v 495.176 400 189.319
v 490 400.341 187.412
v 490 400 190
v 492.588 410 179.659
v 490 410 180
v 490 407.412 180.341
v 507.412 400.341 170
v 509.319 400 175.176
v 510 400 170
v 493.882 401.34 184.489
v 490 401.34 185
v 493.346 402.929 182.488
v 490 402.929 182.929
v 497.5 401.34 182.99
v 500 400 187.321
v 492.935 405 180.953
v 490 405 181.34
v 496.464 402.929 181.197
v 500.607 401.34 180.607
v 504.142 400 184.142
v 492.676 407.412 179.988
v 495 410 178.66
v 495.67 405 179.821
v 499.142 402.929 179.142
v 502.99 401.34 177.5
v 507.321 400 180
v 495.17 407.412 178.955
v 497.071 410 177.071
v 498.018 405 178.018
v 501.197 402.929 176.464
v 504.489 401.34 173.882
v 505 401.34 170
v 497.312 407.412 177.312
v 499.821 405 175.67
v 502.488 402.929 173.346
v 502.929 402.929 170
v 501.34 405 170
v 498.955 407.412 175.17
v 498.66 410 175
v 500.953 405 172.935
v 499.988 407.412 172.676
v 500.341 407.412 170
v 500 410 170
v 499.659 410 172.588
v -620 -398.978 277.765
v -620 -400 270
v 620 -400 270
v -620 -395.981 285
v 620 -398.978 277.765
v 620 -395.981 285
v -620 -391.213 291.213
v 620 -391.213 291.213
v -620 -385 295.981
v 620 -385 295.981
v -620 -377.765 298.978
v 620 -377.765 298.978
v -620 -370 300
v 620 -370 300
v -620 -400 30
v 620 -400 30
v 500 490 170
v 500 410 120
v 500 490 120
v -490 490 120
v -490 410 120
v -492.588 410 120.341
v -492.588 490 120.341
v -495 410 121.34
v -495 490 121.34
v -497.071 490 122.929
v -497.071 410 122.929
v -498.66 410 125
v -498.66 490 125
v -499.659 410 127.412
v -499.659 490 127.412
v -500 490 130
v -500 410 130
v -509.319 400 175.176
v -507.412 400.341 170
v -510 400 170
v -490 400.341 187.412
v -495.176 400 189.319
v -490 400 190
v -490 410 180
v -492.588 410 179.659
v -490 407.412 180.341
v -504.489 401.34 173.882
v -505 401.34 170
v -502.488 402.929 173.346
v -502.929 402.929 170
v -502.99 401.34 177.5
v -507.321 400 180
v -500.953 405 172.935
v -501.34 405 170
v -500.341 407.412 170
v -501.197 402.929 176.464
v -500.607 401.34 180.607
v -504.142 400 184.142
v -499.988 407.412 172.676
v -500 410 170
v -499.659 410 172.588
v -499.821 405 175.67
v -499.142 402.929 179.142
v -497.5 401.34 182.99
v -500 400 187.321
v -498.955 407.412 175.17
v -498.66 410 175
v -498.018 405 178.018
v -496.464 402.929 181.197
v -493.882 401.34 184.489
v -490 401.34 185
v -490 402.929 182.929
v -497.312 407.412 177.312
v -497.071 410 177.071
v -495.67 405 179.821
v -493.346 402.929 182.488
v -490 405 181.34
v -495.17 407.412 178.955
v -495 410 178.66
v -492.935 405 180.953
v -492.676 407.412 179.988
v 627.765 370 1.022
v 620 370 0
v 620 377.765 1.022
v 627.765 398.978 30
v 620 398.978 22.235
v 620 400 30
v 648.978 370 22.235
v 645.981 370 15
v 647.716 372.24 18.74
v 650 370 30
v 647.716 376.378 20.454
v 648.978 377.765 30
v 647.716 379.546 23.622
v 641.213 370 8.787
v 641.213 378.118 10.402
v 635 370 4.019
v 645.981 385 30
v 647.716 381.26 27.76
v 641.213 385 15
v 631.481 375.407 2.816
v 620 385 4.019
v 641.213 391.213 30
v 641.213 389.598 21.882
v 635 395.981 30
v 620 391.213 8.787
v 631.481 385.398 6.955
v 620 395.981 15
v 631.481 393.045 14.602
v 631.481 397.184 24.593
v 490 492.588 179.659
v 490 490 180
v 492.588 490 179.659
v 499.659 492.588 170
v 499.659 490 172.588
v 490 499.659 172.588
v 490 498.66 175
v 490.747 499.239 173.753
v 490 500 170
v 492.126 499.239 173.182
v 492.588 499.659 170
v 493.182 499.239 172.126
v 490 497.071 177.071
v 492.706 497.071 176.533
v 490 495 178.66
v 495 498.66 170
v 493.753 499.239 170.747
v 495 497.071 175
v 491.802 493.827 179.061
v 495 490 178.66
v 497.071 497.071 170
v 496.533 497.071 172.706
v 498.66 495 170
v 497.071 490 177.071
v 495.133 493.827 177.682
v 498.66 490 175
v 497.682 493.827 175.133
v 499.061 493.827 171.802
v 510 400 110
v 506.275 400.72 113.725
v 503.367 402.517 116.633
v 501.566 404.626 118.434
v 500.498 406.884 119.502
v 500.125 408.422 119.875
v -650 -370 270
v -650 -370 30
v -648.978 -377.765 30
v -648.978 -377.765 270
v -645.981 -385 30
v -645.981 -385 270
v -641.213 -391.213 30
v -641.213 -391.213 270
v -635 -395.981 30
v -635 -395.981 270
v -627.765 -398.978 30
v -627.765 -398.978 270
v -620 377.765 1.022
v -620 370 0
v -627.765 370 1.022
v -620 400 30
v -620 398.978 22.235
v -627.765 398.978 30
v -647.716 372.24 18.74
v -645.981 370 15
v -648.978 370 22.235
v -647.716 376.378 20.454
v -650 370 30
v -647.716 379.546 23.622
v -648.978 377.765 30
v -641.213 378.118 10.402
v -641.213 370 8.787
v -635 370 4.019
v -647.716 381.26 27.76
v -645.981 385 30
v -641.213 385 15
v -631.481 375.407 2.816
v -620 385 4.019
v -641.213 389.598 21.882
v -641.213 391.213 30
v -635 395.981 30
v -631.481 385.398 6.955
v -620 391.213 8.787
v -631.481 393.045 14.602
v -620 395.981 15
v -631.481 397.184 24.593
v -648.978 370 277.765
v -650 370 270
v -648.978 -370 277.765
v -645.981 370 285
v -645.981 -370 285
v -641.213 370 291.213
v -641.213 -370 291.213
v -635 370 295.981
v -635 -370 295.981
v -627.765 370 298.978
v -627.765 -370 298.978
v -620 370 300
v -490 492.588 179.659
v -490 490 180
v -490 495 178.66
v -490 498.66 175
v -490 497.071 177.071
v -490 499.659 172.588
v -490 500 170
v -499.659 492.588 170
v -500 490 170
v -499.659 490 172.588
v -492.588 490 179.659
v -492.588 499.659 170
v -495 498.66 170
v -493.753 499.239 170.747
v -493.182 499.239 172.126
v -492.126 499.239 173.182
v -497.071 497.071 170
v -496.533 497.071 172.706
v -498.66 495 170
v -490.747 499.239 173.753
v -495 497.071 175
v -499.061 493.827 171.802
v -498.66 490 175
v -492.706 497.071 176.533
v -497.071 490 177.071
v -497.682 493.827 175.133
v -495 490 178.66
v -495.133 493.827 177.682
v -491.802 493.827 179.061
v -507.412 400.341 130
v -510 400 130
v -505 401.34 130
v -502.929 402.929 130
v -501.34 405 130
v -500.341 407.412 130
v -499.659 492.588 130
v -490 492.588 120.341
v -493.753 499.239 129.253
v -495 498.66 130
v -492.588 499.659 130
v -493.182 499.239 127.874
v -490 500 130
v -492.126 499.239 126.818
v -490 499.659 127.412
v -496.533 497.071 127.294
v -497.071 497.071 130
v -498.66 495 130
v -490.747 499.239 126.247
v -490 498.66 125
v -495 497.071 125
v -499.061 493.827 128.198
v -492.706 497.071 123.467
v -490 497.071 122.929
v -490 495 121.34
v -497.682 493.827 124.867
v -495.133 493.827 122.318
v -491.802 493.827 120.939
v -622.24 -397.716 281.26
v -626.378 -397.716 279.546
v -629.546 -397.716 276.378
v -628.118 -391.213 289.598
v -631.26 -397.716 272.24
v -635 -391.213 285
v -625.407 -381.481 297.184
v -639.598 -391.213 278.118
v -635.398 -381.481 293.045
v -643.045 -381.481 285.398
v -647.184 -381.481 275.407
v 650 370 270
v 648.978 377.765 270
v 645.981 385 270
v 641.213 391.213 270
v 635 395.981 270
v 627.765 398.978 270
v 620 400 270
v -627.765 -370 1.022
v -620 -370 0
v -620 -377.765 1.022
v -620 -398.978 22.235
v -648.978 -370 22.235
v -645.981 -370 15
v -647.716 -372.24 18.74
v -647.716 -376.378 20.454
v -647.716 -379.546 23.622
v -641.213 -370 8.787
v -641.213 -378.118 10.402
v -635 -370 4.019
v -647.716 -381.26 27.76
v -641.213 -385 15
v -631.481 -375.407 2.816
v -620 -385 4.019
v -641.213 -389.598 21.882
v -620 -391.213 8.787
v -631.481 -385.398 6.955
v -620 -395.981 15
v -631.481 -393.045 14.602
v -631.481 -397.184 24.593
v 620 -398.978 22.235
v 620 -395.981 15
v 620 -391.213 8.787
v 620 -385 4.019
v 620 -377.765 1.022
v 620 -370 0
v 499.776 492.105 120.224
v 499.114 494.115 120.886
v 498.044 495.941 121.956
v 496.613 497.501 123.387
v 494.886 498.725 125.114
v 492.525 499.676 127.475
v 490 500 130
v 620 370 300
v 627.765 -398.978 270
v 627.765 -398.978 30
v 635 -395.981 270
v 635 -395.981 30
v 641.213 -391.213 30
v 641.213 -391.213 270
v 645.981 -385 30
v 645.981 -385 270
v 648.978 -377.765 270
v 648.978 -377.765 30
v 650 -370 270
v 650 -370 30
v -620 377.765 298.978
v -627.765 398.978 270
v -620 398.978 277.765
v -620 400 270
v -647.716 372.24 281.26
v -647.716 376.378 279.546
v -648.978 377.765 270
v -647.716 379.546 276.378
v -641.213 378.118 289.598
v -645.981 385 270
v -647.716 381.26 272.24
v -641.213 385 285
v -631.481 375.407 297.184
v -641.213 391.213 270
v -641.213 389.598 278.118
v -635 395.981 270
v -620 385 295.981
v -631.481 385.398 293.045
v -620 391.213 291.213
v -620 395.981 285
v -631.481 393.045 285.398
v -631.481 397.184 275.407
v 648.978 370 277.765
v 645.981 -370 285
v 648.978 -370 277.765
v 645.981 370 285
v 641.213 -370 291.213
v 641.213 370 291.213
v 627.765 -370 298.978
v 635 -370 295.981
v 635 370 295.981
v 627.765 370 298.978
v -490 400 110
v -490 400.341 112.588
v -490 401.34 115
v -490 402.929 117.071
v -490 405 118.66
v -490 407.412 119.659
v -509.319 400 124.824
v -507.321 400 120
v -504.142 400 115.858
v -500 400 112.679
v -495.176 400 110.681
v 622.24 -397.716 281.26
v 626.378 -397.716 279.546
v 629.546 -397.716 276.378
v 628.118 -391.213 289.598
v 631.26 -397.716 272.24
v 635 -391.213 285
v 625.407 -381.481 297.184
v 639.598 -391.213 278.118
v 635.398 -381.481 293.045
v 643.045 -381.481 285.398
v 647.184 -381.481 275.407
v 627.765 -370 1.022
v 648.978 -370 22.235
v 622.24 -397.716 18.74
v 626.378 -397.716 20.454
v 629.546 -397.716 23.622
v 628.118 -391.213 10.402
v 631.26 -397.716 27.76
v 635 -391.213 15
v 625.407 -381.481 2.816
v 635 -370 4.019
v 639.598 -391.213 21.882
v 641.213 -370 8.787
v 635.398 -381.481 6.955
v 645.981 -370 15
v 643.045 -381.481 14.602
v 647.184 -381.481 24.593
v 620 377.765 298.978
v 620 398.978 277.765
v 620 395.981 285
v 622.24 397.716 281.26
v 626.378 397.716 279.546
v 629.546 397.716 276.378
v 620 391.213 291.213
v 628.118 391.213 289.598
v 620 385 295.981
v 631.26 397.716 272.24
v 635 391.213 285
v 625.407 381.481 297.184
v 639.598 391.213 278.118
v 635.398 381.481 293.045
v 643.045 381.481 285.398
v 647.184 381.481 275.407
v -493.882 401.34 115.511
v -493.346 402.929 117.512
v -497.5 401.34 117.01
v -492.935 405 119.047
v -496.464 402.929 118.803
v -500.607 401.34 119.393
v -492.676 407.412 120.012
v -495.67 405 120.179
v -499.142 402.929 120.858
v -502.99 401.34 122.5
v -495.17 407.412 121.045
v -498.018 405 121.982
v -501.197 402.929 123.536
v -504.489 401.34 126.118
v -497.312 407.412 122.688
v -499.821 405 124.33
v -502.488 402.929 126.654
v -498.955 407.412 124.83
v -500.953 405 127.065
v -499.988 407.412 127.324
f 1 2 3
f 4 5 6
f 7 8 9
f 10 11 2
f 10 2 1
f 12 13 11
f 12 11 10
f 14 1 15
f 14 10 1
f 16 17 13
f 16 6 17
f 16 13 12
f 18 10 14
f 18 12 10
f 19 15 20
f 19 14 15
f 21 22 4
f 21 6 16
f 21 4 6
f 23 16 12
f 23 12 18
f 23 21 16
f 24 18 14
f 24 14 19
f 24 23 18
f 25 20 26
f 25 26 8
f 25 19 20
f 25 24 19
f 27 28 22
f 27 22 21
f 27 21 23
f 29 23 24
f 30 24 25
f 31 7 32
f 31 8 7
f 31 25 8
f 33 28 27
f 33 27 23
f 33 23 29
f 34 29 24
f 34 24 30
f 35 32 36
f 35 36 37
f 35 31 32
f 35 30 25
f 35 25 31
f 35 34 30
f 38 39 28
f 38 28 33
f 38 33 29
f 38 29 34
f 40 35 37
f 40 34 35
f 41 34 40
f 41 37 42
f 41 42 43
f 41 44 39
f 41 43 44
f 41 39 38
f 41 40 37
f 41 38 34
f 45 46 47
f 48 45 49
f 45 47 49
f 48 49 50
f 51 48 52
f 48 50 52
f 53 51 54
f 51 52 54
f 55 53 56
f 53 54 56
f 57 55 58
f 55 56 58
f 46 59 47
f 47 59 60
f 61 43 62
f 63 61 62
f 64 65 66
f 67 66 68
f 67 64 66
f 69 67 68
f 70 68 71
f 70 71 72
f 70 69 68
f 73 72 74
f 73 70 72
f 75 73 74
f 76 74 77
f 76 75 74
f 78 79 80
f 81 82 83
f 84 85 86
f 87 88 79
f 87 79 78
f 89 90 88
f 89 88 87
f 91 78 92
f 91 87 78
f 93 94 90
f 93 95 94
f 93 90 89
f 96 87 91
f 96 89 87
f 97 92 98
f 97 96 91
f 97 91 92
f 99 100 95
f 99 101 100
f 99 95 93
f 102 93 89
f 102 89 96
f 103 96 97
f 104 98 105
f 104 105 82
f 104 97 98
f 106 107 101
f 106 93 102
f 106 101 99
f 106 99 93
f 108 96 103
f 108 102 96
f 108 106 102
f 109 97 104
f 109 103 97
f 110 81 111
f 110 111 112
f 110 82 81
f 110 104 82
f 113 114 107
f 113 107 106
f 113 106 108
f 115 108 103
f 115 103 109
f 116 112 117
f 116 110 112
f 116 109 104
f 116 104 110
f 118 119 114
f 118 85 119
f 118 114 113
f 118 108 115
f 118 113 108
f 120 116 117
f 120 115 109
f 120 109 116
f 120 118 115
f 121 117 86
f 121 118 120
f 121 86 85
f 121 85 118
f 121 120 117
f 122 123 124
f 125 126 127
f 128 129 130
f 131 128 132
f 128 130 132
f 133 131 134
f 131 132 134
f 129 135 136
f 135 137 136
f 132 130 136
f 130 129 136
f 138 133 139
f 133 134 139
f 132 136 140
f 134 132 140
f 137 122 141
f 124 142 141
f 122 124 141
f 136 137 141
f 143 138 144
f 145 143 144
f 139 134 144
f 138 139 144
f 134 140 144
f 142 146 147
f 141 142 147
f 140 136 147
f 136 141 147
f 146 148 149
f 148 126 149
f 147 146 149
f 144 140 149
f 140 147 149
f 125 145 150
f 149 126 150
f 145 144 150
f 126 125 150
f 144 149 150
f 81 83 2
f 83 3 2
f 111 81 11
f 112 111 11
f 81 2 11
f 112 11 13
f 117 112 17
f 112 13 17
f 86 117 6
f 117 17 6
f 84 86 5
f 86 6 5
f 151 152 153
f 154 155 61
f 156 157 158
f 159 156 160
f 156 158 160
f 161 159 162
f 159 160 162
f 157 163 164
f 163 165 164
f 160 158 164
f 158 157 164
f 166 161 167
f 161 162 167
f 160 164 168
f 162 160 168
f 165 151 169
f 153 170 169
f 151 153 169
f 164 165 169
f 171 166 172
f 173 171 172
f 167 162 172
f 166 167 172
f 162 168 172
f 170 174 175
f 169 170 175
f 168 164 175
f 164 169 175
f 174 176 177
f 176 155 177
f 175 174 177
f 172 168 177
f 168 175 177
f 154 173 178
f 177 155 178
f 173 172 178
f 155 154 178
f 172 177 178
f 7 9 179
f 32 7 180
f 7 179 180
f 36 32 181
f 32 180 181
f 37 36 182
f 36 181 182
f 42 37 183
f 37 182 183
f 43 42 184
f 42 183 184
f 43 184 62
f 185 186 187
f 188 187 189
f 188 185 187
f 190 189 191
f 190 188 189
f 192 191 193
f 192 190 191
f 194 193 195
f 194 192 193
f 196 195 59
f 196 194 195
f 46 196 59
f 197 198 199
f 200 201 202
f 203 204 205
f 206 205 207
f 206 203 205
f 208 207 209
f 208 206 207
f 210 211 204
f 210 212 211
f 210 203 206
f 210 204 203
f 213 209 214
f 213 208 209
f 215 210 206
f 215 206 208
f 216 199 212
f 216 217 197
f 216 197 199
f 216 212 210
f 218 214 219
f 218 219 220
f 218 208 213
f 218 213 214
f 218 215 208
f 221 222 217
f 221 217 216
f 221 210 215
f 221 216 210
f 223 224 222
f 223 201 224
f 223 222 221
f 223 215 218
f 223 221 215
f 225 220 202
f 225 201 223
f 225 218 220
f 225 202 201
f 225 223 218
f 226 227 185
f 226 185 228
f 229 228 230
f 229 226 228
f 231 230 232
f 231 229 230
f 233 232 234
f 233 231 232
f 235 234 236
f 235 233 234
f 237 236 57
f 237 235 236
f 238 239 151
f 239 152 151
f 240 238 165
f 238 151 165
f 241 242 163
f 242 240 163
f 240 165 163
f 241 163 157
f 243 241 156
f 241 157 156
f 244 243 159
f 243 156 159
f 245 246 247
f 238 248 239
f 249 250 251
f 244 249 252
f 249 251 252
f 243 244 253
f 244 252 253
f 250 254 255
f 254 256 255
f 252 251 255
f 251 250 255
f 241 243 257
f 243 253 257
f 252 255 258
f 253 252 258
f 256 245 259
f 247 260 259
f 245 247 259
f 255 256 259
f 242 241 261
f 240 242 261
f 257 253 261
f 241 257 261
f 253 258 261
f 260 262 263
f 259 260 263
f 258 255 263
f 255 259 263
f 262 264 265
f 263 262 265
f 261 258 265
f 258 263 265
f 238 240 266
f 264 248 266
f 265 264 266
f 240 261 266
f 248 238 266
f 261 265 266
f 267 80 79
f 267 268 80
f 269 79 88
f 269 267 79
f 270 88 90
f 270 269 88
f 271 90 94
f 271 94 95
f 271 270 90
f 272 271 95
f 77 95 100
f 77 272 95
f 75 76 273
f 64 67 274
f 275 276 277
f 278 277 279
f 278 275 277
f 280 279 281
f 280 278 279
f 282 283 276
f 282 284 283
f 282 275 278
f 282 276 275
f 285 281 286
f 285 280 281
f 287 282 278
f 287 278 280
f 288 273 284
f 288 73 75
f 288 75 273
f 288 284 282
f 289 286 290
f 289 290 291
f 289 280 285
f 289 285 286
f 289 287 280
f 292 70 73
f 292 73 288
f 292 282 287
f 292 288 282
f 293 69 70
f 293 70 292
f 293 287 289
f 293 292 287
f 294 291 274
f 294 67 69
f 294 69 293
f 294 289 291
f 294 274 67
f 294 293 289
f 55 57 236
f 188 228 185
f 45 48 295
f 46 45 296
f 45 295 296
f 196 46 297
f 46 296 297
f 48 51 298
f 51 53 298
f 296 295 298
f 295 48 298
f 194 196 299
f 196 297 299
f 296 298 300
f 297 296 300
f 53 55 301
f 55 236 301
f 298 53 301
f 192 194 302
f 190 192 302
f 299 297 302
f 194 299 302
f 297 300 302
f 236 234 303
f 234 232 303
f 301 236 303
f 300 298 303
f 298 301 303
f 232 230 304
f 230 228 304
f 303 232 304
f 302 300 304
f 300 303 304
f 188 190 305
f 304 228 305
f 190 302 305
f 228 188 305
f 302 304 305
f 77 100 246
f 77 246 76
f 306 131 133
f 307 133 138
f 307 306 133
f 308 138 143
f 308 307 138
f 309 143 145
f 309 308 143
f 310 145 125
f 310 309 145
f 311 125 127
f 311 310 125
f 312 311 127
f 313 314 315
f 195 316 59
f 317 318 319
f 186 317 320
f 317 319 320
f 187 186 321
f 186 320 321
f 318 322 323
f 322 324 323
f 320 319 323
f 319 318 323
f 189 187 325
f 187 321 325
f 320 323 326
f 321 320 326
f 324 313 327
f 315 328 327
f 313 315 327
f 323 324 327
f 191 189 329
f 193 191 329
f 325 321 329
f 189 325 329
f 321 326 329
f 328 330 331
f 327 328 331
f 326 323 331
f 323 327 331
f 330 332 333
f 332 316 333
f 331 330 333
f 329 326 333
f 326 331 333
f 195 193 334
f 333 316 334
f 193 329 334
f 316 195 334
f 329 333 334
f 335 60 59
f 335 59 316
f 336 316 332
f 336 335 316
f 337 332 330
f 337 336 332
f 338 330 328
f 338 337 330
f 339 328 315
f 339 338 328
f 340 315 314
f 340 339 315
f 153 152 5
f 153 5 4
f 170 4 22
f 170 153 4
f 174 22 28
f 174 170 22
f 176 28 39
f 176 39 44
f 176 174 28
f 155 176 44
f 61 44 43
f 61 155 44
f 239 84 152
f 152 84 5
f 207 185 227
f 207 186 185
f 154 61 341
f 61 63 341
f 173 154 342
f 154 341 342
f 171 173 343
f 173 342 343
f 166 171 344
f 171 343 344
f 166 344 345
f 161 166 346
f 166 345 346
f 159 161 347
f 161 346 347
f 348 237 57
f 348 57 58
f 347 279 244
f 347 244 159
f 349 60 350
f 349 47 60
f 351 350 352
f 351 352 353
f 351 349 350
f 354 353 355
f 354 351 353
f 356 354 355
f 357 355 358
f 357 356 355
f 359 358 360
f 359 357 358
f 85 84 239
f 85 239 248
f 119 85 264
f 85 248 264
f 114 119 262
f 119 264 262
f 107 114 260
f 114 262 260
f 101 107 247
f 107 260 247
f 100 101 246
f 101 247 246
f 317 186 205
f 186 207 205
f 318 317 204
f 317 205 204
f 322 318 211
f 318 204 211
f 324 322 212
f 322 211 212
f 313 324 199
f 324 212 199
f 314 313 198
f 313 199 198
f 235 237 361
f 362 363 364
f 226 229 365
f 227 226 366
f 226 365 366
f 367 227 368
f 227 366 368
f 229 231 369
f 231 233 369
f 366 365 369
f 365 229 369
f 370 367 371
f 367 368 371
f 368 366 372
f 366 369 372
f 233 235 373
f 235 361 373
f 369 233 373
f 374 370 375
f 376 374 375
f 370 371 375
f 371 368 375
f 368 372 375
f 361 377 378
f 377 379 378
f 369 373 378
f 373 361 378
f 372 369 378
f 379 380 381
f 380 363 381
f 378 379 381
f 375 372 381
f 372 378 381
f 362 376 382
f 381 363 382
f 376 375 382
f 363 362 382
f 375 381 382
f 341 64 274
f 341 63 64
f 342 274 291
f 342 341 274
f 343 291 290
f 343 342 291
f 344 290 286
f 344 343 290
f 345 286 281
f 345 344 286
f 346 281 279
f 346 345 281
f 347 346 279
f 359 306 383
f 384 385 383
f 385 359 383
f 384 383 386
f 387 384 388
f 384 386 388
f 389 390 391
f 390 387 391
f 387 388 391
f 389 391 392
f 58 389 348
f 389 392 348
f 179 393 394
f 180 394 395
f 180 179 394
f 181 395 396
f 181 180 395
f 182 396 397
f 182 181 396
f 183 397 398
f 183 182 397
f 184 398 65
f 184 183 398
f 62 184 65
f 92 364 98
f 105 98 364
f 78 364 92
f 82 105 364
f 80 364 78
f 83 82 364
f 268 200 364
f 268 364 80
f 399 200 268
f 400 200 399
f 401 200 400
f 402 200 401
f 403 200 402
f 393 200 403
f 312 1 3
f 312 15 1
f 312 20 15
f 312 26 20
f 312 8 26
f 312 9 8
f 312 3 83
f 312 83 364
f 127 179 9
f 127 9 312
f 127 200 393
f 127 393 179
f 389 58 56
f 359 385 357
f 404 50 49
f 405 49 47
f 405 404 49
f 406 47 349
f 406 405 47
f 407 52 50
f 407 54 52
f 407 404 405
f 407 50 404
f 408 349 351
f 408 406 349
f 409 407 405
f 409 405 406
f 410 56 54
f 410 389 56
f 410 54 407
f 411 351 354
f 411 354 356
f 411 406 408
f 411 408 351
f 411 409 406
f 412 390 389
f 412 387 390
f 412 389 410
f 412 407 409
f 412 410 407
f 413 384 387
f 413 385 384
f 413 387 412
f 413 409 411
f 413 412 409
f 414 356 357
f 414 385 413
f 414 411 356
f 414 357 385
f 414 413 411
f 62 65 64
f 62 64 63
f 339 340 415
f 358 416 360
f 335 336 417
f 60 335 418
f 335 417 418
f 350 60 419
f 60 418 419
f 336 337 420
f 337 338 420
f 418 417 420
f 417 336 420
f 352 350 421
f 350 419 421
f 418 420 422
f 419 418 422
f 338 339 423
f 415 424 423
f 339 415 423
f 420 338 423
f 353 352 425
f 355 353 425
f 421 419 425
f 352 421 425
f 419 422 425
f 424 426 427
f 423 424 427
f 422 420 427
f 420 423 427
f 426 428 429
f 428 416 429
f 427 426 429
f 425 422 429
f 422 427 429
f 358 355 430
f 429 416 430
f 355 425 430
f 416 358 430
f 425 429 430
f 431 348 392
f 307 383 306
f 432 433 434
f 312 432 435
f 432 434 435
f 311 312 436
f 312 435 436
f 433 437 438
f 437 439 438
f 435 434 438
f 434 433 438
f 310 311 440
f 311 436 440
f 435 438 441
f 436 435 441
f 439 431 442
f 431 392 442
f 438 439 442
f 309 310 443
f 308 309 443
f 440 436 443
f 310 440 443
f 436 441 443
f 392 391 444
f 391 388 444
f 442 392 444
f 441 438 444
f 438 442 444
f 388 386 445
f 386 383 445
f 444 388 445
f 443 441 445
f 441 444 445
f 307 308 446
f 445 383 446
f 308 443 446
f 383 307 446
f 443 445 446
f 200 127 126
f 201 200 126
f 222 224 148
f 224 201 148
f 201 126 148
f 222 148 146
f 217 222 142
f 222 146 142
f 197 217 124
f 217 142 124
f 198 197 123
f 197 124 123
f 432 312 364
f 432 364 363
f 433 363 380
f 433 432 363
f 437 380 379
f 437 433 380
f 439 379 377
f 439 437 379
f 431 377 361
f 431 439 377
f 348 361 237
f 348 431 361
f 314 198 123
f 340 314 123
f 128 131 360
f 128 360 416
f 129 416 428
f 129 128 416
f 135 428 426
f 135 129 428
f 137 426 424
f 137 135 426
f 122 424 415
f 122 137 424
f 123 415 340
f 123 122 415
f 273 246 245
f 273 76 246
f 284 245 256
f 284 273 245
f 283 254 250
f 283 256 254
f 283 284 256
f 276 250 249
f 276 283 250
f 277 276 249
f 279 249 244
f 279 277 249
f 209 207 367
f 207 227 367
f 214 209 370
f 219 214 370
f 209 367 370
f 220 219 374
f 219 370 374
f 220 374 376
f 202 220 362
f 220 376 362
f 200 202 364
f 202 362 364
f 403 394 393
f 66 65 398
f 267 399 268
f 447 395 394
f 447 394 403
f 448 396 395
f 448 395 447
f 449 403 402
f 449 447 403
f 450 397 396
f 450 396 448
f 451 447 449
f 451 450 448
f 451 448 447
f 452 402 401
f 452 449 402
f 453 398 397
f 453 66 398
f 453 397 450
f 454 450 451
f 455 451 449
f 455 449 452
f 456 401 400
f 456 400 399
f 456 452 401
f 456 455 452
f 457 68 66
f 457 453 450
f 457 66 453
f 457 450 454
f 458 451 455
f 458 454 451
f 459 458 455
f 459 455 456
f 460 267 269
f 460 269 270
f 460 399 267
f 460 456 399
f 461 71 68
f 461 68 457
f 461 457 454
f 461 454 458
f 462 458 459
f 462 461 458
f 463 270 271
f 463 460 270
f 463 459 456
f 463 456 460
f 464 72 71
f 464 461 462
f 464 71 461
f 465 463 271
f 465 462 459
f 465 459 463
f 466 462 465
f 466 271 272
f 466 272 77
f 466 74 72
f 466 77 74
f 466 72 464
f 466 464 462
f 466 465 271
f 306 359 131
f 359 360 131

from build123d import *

# Parameters (mm, degrees)
SKETCH_1_W      = 1300
SKETCH_1_H      = 800
EXTRUDE_1_DEPTH = 300
FILLET_1_R      = 30
SKETCH_2_W      = 1000
SKETCH_2_H      = 60
EXTRUDE_2_DEPTH = 100
FILLET_2_R      = 10


with BuildPart() as part:
    # 草图1 → 凸台-拉伸1 (new body)
    with BuildSketch(Plane.XY):
        Rectangle(SKETCH_1_W, SKETCH_1_H)
    extrude(amount=EXTRUDE_1_DEPTH)

    # 圆角1
    fillet_1_edges = [part.edges().sort_by_distance(p)[0] for p in [
        (650, 0, 300),
        (0, 400, 300),
        (-650, 0, 300),
        (0, 400, 0),
        (650, 0, 0),
        (0, -400, 0),
        (-650, 0, 0),
        (0, -400, 300),
        (-650, 400, 150),
        (650, 400, 150),
        (650, -400, 150),
        (-650, -400, 150),
    ]]
    fillet(fillet_1_edges, radius=FILLET_1_R)

    # 草图2 → 凸台-拉伸2 (add)
    with BuildSketch(Plane(origin=(0, 400, 0), x_dir=(1, 0, 0), z_dir=(0, 1, 0))):
        with Locations((0, -150)):
            Rectangle(SKETCH_2_W, SKETCH_2_H)
    extrude(amount=EXTRUDE_2_DEPTH)

    # 圆角2
    fillet_2_edges = [part.edges().sort_by_distance(p)[0] for p in [
        (-500, 400, 150),
        (-500, 450, 120),
        (0, 400, 180),
        (-500, 450, 180),
        (500, 400, 150),
        (500, 450, 180),
        (0, 400, 120),
        (-500, 500, 150),
        (0, 500, 180),
        (500, 500, 150),
        (0, 500, 120),
    ]]
    fillet(fillet_2_edges, radius=FILLET_2_R)


solid = part.part
